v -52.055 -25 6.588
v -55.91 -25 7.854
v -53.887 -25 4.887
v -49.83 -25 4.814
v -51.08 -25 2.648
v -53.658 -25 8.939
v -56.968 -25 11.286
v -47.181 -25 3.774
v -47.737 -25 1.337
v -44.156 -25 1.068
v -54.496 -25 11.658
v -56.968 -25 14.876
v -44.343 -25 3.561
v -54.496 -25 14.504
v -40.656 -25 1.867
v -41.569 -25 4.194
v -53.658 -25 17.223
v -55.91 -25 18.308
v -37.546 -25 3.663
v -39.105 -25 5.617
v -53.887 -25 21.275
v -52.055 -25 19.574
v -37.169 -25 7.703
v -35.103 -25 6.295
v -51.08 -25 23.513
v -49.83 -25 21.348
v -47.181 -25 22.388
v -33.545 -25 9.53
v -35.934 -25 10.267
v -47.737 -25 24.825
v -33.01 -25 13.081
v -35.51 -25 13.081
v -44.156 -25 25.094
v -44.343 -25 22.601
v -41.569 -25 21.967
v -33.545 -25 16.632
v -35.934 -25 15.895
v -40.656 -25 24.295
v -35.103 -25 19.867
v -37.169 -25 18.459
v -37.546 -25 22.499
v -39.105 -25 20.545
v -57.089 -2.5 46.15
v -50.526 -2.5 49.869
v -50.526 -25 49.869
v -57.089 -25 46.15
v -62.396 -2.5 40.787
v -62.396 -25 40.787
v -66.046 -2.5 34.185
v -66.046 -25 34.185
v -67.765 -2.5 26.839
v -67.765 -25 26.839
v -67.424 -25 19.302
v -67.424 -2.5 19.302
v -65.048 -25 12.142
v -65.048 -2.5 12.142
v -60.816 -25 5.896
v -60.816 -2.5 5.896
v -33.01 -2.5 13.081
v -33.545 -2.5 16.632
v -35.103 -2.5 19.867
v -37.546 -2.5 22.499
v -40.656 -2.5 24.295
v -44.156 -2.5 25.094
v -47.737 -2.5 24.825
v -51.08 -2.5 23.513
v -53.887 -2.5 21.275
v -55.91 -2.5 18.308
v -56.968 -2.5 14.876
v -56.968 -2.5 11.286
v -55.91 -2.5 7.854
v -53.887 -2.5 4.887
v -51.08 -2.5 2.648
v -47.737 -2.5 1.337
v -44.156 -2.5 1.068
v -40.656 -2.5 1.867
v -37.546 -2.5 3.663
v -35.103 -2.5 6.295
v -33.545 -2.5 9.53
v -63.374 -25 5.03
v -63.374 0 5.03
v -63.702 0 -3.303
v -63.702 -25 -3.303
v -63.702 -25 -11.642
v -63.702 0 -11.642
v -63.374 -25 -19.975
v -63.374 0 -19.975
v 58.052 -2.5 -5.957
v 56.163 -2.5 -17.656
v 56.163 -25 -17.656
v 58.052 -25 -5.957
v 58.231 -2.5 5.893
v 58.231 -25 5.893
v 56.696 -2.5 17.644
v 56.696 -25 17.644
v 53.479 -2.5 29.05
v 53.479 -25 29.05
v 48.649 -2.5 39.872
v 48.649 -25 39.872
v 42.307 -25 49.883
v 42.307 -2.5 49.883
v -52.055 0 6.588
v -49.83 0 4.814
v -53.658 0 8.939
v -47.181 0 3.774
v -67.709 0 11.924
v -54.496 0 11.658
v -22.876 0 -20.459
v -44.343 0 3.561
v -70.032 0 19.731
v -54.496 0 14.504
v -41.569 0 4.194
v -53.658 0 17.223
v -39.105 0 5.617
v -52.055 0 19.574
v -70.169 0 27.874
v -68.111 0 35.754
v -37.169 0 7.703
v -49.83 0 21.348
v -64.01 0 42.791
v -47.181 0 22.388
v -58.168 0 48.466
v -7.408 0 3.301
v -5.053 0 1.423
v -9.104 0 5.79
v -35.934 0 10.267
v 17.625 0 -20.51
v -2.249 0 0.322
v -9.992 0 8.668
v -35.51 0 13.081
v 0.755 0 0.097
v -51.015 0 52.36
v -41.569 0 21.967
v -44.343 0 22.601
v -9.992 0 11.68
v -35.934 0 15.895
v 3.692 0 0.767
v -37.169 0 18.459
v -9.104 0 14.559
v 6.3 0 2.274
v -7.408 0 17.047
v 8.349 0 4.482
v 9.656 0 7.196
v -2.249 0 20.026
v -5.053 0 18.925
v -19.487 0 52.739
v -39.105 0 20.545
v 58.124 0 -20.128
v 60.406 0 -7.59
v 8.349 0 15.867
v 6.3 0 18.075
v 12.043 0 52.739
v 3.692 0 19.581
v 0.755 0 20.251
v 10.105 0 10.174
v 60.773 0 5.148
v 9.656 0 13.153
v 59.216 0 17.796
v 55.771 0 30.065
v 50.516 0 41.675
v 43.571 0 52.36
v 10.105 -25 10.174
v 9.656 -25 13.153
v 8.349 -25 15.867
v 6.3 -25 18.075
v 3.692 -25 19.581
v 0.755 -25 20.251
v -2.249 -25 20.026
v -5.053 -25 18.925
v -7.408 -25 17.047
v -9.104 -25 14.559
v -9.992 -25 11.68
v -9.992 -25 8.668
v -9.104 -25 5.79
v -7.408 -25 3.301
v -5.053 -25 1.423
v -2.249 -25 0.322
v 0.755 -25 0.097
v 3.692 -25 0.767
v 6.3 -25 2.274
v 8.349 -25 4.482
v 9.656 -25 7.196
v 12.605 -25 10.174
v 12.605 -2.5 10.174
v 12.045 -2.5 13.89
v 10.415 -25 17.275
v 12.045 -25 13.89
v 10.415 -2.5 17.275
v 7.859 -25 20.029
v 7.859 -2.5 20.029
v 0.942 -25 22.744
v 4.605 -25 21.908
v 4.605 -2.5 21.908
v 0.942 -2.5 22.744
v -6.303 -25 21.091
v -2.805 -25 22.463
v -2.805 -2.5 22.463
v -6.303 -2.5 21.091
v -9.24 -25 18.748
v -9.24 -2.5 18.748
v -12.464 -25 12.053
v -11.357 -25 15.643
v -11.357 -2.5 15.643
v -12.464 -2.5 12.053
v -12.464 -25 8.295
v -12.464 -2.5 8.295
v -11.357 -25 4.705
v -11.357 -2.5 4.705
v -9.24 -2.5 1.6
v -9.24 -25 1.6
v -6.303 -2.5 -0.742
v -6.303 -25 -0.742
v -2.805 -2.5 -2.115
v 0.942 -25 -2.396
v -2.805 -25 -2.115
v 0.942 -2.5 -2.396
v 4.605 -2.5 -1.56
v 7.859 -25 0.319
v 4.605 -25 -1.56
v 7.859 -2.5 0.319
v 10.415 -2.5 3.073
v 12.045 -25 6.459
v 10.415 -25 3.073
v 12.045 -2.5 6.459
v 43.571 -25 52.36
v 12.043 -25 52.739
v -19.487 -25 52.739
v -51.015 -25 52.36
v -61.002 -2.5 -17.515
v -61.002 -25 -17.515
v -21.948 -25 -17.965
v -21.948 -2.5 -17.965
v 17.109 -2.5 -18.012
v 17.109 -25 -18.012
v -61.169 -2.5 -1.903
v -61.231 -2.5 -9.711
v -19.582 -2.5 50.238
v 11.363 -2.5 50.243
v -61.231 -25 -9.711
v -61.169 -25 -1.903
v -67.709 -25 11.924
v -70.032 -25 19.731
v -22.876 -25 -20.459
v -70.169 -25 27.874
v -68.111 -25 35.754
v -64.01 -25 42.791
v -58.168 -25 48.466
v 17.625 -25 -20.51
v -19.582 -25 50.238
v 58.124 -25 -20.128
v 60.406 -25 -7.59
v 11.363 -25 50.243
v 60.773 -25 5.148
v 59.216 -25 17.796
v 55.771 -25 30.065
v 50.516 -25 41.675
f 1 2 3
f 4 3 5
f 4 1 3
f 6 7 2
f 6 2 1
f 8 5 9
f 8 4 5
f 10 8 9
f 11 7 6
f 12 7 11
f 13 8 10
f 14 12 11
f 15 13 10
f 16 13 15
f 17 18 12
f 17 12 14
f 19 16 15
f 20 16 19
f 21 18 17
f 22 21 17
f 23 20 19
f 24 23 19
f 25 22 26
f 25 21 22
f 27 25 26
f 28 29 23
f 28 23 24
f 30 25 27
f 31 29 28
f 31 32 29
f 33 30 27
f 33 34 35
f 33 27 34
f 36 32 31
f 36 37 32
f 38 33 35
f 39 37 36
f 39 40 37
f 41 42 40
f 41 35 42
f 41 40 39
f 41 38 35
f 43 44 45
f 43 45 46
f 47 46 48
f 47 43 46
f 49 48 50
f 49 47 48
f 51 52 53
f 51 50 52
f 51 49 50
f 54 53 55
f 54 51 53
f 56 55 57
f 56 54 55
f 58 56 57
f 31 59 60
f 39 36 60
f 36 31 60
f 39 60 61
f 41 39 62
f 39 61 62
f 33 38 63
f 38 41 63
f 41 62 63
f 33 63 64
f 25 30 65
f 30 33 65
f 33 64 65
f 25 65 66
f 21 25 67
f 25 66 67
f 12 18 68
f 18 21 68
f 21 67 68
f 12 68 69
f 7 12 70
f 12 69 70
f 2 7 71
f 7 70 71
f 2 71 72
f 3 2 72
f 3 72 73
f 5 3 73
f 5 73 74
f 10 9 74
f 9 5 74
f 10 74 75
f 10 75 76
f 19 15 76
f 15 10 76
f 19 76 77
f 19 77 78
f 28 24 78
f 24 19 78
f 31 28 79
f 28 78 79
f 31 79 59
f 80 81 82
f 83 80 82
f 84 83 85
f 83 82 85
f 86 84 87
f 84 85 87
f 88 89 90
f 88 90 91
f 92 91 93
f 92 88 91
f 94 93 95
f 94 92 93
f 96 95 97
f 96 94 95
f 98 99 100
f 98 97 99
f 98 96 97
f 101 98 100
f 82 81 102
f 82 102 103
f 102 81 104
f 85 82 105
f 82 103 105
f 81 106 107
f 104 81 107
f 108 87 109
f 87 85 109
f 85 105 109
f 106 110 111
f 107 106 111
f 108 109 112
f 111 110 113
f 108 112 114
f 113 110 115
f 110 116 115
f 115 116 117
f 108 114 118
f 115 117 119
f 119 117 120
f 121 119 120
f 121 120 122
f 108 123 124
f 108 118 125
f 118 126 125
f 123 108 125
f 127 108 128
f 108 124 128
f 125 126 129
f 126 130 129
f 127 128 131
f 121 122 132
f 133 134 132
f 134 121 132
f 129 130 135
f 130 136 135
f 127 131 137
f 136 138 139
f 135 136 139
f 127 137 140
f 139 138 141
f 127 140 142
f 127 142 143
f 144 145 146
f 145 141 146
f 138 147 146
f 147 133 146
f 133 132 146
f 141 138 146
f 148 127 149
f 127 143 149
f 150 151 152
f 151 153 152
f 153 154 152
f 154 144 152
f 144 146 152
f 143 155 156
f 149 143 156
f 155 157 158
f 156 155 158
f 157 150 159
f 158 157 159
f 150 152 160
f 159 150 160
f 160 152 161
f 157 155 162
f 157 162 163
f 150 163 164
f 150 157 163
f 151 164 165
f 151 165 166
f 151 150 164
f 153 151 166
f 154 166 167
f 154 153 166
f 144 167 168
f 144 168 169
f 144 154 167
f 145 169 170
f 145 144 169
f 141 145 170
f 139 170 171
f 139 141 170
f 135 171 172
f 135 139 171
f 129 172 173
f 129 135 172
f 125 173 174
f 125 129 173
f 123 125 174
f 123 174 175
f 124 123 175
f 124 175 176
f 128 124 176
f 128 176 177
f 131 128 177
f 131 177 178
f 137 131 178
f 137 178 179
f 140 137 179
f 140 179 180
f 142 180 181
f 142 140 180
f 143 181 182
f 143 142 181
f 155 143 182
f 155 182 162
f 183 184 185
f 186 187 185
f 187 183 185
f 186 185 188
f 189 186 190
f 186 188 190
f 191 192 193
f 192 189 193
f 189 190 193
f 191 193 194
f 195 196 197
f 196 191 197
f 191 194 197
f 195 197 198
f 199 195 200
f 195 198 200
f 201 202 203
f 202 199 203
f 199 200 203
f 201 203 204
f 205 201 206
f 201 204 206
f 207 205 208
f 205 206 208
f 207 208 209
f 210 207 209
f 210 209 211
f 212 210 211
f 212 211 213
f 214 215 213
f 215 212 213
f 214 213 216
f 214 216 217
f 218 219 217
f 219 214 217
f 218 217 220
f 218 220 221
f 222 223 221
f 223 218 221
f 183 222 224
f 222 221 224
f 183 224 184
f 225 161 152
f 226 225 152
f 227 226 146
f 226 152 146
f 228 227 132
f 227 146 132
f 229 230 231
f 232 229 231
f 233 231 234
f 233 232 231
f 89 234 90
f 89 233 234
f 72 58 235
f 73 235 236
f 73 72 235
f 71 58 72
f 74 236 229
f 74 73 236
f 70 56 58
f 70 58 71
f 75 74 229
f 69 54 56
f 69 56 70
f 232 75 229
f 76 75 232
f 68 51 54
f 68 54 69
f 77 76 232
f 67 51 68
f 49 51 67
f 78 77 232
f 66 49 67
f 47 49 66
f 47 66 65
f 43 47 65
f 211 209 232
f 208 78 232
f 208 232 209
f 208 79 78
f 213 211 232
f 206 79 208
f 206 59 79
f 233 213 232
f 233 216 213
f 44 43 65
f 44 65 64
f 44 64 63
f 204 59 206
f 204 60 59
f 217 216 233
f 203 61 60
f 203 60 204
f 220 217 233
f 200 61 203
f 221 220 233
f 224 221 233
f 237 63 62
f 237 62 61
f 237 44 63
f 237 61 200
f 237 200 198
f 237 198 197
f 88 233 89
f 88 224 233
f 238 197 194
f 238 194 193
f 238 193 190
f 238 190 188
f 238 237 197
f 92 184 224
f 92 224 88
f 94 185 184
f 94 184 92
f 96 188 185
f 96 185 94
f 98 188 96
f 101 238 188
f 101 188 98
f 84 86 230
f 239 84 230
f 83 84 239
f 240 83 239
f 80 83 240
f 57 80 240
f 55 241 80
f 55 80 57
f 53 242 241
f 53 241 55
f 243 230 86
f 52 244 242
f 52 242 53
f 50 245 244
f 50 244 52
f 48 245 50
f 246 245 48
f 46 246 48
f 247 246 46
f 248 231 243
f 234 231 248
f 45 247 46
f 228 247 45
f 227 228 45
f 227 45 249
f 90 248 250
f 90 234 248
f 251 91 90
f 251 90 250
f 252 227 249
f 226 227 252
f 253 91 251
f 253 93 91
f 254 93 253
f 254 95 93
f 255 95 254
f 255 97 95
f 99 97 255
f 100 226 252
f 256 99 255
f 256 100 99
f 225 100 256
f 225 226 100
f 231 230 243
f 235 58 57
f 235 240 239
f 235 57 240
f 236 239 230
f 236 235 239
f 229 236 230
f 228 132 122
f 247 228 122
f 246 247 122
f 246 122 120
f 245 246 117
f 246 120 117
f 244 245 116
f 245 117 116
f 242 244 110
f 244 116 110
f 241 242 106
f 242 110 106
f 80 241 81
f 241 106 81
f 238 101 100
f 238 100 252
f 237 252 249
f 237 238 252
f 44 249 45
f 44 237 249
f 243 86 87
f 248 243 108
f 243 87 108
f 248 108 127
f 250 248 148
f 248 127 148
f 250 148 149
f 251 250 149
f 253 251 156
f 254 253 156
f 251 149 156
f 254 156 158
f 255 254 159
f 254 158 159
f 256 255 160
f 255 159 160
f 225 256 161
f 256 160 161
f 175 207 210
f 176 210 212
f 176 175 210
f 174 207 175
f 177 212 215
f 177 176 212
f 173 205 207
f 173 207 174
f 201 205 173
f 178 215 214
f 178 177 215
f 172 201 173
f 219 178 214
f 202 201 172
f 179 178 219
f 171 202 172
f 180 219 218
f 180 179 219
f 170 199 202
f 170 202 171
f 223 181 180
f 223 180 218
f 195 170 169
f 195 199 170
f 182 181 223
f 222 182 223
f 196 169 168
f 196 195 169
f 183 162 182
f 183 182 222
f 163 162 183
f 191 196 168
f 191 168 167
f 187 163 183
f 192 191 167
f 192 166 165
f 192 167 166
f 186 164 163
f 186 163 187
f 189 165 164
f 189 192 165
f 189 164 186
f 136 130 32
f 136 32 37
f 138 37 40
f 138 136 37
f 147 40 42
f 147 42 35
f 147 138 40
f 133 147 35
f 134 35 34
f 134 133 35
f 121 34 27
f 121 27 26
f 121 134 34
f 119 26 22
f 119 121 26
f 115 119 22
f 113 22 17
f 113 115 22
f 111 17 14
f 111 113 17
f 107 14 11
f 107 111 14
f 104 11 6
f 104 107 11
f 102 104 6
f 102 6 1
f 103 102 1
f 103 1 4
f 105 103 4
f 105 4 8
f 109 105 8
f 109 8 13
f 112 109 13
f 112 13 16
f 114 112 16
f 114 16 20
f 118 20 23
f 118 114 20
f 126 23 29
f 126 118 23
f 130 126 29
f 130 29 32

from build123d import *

# Parameters (mm, degrees)
F0_R     = 9.5463982086
F0_R_2   = 10.1052061562
F1_DEPTH = 25
F2_T     = -2.5


with BuildPart() as f1:
    # F0 (on Front) → F1 (new body)
    with BuildSketch(Plane.XZ):
        with BuildLine():
            ThreePointArc((-63.3736327291, -19.9749078602), (-2.6254435723, -20.5386626808), (58.1239726957, -20.1278970252))
            ThreePointArc((58.1239726957, -20.1278970252), (59.2157785581, 17.7962266983), (43.5713953632, 52.3604346985))
            ThreePointArc((43.5713953632, 52.3604346985), (-3.7218306533, 52.7863086545), (-51.0150566697, 52.3604346985))
            ThreePointArc((-51.0150566697, 52.3604346985), (-69.4086528725, 31.8843311692), (-63.3736327291, 5.029653199))
            ThreePointArc((-63.3736327291, 5.029653199), (-63.743030193, -7.4726273306), (-63.3736327291, -19.9749078602))
        make_face()
        with Locations((-45.056629926, 13.0809573457)):
            Circle(F0_R, mode=Mode.SUBTRACT)
        with Locations((0, 10.1740779355)):
            Circle(F0_R_2, mode=Mode.SUBTRACT)
    extrude(amount=F1_DEPTH)

    # F2
    f2_openings = [f1.faces().sort_by_distance(p)[0] for p in [
        (-2.62355, -25, -19.035238),
    ]]
    offset(amount=F2_T, openings=f2_openings, kind=Kind.INTERSECTION)


solid = f1.part
